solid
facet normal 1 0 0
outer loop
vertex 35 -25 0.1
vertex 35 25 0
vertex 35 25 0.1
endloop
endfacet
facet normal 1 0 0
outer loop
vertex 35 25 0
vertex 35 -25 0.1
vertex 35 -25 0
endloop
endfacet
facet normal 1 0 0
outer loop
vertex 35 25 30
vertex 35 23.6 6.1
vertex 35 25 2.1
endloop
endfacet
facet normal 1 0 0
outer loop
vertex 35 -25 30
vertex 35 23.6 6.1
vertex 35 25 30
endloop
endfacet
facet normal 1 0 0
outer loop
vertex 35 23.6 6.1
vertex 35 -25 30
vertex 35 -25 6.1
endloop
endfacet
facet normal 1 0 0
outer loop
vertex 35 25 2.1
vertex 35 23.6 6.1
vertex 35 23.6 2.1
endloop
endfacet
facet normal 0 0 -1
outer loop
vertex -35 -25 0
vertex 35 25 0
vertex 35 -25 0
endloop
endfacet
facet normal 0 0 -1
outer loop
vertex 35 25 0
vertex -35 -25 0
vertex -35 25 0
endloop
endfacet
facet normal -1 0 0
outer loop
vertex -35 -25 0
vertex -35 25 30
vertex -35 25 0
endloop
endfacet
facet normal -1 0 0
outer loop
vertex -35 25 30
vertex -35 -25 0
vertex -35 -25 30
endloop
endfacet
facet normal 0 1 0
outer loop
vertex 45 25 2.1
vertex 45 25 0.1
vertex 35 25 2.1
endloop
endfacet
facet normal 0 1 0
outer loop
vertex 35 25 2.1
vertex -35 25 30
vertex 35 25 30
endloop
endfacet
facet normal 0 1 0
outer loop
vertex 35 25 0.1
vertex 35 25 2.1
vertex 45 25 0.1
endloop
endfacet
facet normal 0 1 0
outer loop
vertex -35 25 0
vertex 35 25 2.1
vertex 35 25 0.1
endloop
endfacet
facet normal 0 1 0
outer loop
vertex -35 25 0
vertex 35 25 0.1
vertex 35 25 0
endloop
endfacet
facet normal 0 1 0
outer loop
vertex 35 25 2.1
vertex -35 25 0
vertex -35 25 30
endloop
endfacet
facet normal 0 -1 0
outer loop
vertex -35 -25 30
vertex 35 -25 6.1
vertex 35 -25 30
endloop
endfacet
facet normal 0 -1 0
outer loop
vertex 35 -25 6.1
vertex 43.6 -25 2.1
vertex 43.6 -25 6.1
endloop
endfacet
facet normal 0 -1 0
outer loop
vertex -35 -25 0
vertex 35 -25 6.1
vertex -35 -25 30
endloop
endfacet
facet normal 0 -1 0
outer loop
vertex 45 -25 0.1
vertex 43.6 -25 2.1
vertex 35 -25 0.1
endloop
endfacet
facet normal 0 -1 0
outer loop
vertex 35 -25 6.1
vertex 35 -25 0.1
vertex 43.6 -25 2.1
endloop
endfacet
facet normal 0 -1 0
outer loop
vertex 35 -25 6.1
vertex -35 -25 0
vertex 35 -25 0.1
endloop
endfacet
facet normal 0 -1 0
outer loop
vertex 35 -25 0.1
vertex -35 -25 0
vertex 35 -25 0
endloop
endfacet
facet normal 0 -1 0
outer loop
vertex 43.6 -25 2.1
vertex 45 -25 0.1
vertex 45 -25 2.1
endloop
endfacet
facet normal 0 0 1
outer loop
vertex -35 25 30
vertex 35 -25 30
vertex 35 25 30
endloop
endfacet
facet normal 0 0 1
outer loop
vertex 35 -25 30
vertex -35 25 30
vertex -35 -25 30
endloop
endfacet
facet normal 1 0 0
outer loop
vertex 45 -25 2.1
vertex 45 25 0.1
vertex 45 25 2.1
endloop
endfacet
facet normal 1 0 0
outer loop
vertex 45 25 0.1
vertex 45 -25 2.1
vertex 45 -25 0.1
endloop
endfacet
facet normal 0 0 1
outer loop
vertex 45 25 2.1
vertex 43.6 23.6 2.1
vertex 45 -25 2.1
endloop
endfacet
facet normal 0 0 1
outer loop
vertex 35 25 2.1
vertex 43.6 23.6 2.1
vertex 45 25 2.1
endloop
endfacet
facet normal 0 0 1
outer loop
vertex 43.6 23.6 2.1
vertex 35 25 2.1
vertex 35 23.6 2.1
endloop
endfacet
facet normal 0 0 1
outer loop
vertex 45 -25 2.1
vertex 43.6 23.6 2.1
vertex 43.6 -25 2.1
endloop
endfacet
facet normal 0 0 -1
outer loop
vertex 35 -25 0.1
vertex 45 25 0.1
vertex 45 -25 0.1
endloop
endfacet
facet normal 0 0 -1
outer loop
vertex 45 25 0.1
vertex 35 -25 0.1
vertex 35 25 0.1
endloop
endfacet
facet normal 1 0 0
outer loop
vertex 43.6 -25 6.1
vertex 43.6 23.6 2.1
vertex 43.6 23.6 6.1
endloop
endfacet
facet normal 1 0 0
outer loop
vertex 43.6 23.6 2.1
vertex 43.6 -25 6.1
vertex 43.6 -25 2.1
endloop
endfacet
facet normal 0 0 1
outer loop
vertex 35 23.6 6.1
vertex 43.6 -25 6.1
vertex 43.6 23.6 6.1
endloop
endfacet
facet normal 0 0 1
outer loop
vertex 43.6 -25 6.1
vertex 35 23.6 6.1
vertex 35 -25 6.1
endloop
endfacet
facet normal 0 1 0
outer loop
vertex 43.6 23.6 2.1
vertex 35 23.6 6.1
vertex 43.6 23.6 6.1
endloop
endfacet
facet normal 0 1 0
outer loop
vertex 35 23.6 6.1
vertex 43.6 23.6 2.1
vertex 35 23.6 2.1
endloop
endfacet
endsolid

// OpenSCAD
// Two-part enclosure for electronics board.
// Part 1: Box (left). Part 2: Lid (right, printed upside down).
// Both parts are centred on the XY plane at Z=0.
// A small Z-gap is added to ensure they print together but remain separable.

// --- Dimensions ---
// Box outer dimensions (X, Y, Z)
box_X = 70;
box_Y = 50;
box_Z = 30;

// Wall and floor thickness
wall_thick = 2;
floor_thick = 2;

// Gap between parts (X direction)
gap = 10;

// Lid dimensions
lid_plate_thick = 2;
lip_wall_thick = 1.5;
lip_height = 4;

// Lid inner size (to fit box with 0.2mm clearance)
// Box Inner = 70 - 4 = 66. Lid Inner = 66 - 0.4 = 65.6.
lip_inner_X = 65.6;
lip_inner_Y = 45.6;

// Lid outer size (calculated from inner + 2*wall)
lip_outer_X = lip_inner_X + 2 * lip_wall_thick;
lip_outer_Y = lip_inner_Y + 2 * lip_wall_thick;

// --- Part 1: Box ---
// Position: Centred at X = -gap/2, Y = 0, Z = 0.
// The box sits on Z=0.

module box() {
    translate([-box_X / 2, -box_Y / 2, 0]) {
        // Floor
        cube([box_X, box_Y, floor_thick]);
        
        // Walls (difference to cut out the inside)
        // We build the solid block and subtract the inner void.
        // Solid block:
        translate([0, 0, floor_thick]) cube([box_X, box_Y, box_Z - floor_thick]);
        
        // Inner void (cut out)
        // Void starts at floor_thick, goes up to box_Z.
        // Width: box_inner_X, Height: box_inner_Y.
        translate([0, 0, floor_thick]) cube([box_X - 2 * wall_thick, box_Y - 2 * wall_thick, box_Z - floor_thick]);
    }
}

// --- Part 2: Lid ---
// Position: Centred at X = gap/2, Y = 0, Z = 0.
// Printed upside down: Plate on bed, lip on top.
// Lid geometry:
// Plate: 70 x 50 x 2mm.
// Lip: Rectangular wall on top.
// Lip thickness: 1.5mm.
// Lip height: 4mm.
// Lip inner: 65.6 x 45.6 (to fit box).
// Lip outer: 68.6 x 48.6 (calculated).

module lid() {
    translate([-box_X / 2 + gap, -box_Y / 2, 0]) {
        // Plate
        cube([box_X, box_Y, lid_plate_thick]);
        
        // Lip
        // Lip is a hollow box on top of the plate.
        // Base of lip is at z = lid_plate_thick.
        // Top of lip is at z = lid_plate_thick + lip_height.
        // Outer dims: lip_outer_X, lip_outer_Y.
        // Inner dims: lip_inner_X, lip_inner_Y.
        
        // Solid block for the lip
        translate([0, 0, lid_plate_thick]) cube([lip_outer_X, lip_outer_Y, lip_height]);
        
        // Inner void for the lip
        translate([0, 0, lid_plate_thick]) cube([lip_inner_X, lip_inner_Y, lip_height]);
    }
}

// --- Assembly ---
// Add a small Z-gap (0.1mm) between the box top and lid bottom to ensure they are distinct parts
// while printing together.
// Box top is at Z = box_Z.
// Lid bottom is at Z = 0 + lid_plate_thick = 2.
// We need to lift the lid up by 0.1mm relative to the box, or lower the box.
// Since the box is fixed at Z=0, we will translate the lid up by 0.1mm.
// Wait, the lid sits on the bed (Z=0). The box sits on the bed (Z=0).
// If we print them together, they are fused.
// To make them separable, we must introduce a gap in the geometry.
// We can translate the lid UP by 0.1mm so there is a 0.1mm air gap between the box top and lid bottom.
// This means the lid will be floating 0.1mm above the bed in the model, but the box is on the bed.
// This creates a 0.1mm gap between the two parts.

difference() {
    union() {
        box();
        translate([0, 0, 0.1]) lid(); // Lift lid by 0.1mm to create a gap
    }
}
